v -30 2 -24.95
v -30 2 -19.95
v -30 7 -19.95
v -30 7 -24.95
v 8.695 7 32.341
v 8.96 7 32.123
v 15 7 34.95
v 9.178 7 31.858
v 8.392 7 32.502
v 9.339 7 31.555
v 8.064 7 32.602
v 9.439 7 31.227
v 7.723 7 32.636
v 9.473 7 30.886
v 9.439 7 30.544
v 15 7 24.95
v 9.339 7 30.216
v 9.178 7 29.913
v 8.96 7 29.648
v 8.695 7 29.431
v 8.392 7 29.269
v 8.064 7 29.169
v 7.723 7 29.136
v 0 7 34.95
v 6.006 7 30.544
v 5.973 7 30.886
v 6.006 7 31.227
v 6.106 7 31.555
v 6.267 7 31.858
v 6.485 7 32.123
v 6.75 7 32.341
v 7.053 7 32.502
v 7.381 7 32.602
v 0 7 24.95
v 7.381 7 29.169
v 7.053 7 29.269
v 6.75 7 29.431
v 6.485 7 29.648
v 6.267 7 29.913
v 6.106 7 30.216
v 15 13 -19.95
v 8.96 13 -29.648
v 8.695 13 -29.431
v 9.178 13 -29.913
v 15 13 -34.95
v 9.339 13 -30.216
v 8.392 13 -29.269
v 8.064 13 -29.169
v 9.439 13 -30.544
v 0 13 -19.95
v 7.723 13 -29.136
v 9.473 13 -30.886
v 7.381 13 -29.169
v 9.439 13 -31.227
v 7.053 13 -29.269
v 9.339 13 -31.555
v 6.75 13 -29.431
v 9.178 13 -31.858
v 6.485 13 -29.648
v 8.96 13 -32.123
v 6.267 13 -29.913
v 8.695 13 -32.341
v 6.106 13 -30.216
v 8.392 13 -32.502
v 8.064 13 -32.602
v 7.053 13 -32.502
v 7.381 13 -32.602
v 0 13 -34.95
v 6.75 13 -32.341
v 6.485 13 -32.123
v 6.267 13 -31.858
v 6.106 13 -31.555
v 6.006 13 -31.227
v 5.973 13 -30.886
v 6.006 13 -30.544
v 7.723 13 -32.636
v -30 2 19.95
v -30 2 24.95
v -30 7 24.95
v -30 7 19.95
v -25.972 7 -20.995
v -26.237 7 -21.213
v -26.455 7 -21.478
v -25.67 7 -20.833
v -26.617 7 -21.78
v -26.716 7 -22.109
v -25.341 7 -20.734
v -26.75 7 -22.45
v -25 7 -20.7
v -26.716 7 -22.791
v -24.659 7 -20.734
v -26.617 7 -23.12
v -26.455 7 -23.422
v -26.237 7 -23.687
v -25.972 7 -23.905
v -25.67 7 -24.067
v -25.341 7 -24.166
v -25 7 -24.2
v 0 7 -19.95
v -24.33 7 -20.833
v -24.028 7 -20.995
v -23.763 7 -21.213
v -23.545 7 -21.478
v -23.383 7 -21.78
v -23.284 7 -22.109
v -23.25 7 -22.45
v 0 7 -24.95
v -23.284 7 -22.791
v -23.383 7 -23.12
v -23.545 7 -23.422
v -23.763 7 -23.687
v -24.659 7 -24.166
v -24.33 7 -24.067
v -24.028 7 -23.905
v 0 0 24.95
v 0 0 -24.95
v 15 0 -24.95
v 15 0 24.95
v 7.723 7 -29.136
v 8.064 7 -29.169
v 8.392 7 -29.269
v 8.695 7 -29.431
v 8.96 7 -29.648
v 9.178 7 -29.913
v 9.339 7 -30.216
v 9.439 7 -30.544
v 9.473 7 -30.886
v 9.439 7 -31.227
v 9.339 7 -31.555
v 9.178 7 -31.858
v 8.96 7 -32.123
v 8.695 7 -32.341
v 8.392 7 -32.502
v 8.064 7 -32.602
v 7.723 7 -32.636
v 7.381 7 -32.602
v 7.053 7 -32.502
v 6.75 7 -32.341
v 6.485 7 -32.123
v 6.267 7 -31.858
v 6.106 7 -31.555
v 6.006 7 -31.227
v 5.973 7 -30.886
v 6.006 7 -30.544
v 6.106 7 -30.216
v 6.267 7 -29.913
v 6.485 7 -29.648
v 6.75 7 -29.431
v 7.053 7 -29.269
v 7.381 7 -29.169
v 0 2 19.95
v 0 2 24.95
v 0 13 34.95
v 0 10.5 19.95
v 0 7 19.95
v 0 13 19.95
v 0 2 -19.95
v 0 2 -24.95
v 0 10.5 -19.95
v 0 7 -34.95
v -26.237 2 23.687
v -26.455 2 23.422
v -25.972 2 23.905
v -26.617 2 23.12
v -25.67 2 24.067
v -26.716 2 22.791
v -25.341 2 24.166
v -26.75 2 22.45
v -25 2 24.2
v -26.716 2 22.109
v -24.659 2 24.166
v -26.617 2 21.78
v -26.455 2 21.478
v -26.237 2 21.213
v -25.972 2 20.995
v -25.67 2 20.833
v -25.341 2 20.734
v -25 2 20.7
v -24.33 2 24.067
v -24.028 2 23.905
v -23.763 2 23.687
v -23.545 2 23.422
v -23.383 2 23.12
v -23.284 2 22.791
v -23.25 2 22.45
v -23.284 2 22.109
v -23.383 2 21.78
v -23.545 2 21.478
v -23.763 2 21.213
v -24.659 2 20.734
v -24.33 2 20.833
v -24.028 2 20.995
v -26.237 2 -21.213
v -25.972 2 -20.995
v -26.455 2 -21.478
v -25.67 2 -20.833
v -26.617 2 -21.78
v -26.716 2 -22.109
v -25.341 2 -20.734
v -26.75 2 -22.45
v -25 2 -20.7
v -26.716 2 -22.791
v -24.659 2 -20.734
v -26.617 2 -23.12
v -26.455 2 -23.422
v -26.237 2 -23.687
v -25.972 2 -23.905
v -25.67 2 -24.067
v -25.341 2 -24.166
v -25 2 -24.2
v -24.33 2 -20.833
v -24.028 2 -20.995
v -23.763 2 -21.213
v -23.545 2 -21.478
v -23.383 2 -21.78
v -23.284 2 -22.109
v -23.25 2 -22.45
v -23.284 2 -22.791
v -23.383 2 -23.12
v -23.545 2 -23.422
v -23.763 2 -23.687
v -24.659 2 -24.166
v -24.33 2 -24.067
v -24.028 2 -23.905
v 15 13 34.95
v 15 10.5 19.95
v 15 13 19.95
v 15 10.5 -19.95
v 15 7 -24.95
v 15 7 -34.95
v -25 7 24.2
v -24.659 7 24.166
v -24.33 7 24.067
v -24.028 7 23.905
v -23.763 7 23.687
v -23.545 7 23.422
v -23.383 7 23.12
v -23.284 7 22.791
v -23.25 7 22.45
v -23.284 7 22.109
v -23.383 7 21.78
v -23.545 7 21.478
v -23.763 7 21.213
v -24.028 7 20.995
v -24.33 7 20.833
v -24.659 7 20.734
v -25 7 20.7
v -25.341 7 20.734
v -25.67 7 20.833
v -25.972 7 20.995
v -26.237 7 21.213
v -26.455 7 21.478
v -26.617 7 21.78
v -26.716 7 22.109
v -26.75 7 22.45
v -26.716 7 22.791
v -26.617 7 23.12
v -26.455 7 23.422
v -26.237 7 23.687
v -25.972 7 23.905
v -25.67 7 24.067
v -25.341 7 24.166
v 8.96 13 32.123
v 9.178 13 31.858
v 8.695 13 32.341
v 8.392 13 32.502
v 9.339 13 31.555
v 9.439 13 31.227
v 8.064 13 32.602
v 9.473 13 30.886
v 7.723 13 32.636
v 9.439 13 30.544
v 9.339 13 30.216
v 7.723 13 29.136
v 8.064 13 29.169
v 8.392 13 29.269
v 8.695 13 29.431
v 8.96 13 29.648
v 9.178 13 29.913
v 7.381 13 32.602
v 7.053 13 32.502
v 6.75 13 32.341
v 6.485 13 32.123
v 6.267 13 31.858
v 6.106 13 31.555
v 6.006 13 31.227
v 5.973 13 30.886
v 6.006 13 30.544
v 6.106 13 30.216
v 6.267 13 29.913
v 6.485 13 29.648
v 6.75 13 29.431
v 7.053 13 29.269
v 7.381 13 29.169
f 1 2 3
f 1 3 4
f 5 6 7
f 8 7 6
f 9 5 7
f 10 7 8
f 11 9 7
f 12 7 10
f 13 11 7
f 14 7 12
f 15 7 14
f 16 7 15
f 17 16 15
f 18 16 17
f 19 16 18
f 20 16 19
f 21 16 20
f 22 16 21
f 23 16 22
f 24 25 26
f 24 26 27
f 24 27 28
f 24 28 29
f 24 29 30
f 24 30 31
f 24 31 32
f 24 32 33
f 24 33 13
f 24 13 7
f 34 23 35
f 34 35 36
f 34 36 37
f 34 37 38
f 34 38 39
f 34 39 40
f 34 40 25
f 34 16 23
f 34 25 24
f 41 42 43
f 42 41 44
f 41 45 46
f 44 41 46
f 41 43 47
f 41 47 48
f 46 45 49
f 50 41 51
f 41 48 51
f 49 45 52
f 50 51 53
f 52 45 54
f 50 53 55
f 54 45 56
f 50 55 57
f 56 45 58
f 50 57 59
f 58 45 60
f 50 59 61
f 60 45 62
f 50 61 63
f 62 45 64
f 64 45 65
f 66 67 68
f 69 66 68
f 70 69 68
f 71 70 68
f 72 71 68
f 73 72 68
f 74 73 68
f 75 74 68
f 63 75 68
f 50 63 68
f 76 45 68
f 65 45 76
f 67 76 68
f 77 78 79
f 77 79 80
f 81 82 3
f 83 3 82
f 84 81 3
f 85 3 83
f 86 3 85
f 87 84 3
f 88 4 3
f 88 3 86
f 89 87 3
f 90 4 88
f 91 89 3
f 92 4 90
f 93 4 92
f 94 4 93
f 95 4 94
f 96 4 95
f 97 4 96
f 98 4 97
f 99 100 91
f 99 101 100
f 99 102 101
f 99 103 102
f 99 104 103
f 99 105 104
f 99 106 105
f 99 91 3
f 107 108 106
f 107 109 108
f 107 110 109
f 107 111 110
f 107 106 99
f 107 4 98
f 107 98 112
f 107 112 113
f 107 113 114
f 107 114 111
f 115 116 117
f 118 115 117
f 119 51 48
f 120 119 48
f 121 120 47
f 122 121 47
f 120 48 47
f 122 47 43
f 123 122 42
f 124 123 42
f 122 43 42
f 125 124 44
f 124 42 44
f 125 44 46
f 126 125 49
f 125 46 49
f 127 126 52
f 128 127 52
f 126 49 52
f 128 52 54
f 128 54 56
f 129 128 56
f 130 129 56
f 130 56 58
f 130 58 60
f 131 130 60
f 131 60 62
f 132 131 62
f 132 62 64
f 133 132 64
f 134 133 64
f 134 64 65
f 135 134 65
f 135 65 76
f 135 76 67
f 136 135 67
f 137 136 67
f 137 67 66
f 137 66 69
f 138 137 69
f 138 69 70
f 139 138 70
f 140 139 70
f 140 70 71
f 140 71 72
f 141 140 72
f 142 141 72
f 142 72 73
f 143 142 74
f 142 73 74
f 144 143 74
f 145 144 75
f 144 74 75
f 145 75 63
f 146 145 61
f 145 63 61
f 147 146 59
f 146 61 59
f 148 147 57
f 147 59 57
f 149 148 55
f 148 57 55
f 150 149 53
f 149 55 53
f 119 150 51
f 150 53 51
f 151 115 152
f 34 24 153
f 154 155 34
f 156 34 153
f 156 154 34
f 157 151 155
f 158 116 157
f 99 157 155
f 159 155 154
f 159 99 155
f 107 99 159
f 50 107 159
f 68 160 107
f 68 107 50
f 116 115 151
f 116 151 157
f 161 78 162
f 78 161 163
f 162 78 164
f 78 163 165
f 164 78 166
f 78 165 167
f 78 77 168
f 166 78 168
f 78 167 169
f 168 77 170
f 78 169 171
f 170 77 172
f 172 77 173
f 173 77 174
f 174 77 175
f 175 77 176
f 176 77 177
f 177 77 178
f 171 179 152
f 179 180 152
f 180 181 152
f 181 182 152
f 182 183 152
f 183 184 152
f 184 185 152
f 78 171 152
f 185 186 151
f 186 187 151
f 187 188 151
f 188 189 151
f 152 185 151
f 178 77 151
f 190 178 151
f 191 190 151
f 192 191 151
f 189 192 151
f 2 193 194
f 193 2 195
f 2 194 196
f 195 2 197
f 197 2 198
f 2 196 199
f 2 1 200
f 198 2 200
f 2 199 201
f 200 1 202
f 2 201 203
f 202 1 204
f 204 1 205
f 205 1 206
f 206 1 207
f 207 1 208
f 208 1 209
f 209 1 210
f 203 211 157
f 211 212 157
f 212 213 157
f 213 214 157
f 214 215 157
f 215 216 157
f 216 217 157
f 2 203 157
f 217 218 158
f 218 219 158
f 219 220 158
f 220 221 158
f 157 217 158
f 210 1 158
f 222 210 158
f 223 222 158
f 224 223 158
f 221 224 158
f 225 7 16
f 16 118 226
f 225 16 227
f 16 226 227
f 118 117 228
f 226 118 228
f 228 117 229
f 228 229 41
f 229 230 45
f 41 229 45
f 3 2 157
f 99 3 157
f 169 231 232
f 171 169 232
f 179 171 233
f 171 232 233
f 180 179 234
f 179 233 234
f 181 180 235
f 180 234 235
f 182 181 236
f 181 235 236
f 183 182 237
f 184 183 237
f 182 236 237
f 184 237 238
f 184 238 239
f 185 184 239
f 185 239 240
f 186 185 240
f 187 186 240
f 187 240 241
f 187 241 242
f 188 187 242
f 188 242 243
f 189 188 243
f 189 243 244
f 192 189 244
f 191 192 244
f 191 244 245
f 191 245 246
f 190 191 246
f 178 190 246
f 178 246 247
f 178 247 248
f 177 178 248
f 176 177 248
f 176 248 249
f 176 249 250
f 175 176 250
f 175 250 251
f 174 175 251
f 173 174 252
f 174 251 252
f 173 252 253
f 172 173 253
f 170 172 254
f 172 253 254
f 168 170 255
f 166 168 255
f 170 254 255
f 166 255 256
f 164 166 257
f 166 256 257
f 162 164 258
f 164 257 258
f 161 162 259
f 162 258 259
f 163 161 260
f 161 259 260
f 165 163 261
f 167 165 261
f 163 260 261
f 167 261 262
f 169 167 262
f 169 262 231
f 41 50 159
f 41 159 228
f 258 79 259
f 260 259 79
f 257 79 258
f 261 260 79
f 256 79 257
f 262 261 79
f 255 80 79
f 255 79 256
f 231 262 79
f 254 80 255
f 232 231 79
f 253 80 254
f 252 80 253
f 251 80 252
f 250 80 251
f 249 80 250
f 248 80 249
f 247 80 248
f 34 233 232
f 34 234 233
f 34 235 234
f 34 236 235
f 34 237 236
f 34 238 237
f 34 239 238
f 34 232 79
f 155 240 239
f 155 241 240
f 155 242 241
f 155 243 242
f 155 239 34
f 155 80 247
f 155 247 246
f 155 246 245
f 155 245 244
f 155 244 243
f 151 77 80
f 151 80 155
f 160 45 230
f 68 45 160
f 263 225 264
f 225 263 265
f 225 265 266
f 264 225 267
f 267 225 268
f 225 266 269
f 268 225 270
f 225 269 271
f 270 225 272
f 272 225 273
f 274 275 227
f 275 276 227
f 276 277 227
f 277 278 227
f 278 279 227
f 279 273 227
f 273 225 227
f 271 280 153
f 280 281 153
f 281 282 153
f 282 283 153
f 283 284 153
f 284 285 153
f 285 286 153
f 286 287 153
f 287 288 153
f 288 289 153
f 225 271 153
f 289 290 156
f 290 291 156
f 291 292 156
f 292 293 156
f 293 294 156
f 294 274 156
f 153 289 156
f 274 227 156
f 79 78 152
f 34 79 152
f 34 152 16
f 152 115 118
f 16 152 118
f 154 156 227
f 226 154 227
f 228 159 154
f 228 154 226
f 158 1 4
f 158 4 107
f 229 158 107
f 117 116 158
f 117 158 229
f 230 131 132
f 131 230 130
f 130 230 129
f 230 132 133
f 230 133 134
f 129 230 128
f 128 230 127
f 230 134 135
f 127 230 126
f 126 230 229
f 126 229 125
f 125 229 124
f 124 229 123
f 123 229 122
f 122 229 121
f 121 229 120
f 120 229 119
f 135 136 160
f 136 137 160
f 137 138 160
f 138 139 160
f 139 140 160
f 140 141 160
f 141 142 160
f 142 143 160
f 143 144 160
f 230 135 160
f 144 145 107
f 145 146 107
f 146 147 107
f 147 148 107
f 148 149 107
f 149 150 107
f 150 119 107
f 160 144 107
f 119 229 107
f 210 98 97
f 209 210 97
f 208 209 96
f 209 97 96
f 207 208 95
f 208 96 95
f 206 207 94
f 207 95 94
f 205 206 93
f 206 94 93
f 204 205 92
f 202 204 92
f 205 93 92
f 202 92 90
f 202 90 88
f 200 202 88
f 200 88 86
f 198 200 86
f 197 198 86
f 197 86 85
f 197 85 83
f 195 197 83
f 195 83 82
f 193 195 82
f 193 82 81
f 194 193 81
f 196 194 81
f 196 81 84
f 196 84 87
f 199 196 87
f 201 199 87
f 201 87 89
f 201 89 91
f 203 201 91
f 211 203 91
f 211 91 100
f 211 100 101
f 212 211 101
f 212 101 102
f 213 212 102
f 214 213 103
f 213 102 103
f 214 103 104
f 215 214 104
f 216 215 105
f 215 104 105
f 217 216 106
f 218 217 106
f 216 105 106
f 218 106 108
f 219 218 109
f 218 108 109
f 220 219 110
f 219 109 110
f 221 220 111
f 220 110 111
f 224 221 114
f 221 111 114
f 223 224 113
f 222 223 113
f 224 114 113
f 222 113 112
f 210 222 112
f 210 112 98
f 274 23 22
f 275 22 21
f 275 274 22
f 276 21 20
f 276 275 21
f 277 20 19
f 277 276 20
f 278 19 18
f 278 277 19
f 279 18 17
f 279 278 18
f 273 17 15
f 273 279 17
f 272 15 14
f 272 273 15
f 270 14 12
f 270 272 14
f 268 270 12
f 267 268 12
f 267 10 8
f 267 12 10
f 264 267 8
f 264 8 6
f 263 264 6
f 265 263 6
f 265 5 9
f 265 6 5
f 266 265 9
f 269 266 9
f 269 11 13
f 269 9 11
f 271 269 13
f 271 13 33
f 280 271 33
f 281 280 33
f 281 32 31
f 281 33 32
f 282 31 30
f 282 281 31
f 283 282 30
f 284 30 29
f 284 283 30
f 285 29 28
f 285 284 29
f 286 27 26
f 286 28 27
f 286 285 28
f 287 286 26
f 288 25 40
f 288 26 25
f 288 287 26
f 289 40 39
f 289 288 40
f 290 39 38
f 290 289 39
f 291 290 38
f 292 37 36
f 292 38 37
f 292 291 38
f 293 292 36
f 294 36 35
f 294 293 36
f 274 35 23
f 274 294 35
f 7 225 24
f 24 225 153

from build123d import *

# Parameters (mm, degrees)
SKETCH1_W           = 15
SKETCH1_H           = 49.9
BOSS_EXTRUDE1_DEPTH = 2
SKETCH2_W           = 45
SKETCH2_H           = 5
BOSS_EXTRUDE2_DEPTH = 5
SKETCH3_R           = 1.75
CUT_EXTRUDE1_DEPTH  = 40.642180818
SKETCH4_W           = 15
SKETCH4_H           = 49.9
BOSS_EXTRUDE3_DEPTH = 13
SKETCH5_W           = 15
SKETCH5_H           = 6
BOSS_EXTRUDE4_DEPTH = 10
SKETCH6_R           = 1.75
CUT_EXTRUDE2_DEPTH  = 48.859194519
SKETCH7_W           = 15
SKETCH7_H           = 39.9
CUT_EXTRUDE3_DEPTH  = 2.5


with BuildPart() as part:
    # Sketch1 → Boss-Extrude1 (new body)
    with BuildSketch(Plane(origin=(0, 0, 0), x_dir=(1, 0, 0), z_dir=(0, 1, 0))):
        with Locations((7.5, 0)):
            Rectangle(SKETCH1_W, SKETCH1_H)
    extrude(amount=BOSS_EXTRUDE1_DEPTH)

    # Sketch2 → Boss-Extrude2 (add)
    with BuildSketch(Plane(origin=(0, 2, 0), x_dir=(1, 0, 0), z_dir=(0, 1, 0))):
        with Locations((-7.5, -22.45)):
            Rectangle(SKETCH2_W, SKETCH2_H)
        with Locations((-7.5, 22.45)):
            Rectangle(SKETCH2_W, SKETCH2_H)
    extrude(amount=BOSS_EXTRUDE2_DEPTH)

    # Sketch3 → Cut-Extrude1 (cut, through all)
    with BuildSketch(Plane(origin=(0, 7, 0), x_dir=(1, 0, 0), z_dir=(0, 1, 0))):
        with Locations(Location((-25, -22.45, 0), (0, 0, 270))):
            Circle(SKETCH3_R)
        with Locations(Location((-25, 22.45, 0), (0, 0, 90))):
            Circle(SKETCH3_R)
    extrude(amount=-CUT_EXTRUDE1_DEPTH, mode=Mode.SUBTRACT)

    # Sketch4 → Boss-Extrude3 (add)
    with BuildSketch(Plane(origin=(0, 0, 0), x_dir=(1, 0, 0), z_dir=(0, 1, 0))):
        with Locations((7.5, 0)):
            Rectangle(SKETCH4_W, SKETCH4_H)
    extrude(amount=BOSS_EXTRUDE3_DEPTH)

    # Sketch5 → Boss-Extrude4 (add)
    with BuildSketch(Plane(origin=(0, 0, -24.95), x_dir=(-1, 0, 0), z_dir=(0, 0, -1))):
        with Locations((-7.5, 10)):
            Rectangle(SKETCH5_W, SKETCH5_H)
    boss_extrude4 = extrude(amount=BOSS_EXTRUDE4_DEPTH)

    # Sketch6 → Cut-Extrude2 (cut, through all)
    with BuildSketch(Plane(origin=(0, 13, 0), x_dir=(1, 0, 0), z_dir=(0, 1, 0))):
        with Locations(Location((7.722564817, 30.885688998, 0), (0, 0, 270))):
            Circle(SKETCH6_R)
    cut_extrude2 = extrude(amount=-CUT_EXTRUDE2_DEPTH, mode=Mode.SUBTRACT)

    # Mirror1: Boss-Extrude4, Cut-Extrude2 across plane
    add(boss_extrude4.mirror(Plane.XY))
    add(cut_extrude2.mirror(Plane.XY), mode=Mode.SUBTRACT)

    # Sketch7 → Cut-Extrude3 (cut)
    with BuildSketch(Plane(origin=(0, 13, 0), x_dir=(1, 0, 0), z_dir=(0, 1, 0))):
        with Locations((7.5, 0)):
            Rectangle(SKETCH7_W, SKETCH7_H)
    extrude(amount=-CUT_EXTRUDE3_DEPTH, mode=Mode.SUBTRACT)


solid = part.part
